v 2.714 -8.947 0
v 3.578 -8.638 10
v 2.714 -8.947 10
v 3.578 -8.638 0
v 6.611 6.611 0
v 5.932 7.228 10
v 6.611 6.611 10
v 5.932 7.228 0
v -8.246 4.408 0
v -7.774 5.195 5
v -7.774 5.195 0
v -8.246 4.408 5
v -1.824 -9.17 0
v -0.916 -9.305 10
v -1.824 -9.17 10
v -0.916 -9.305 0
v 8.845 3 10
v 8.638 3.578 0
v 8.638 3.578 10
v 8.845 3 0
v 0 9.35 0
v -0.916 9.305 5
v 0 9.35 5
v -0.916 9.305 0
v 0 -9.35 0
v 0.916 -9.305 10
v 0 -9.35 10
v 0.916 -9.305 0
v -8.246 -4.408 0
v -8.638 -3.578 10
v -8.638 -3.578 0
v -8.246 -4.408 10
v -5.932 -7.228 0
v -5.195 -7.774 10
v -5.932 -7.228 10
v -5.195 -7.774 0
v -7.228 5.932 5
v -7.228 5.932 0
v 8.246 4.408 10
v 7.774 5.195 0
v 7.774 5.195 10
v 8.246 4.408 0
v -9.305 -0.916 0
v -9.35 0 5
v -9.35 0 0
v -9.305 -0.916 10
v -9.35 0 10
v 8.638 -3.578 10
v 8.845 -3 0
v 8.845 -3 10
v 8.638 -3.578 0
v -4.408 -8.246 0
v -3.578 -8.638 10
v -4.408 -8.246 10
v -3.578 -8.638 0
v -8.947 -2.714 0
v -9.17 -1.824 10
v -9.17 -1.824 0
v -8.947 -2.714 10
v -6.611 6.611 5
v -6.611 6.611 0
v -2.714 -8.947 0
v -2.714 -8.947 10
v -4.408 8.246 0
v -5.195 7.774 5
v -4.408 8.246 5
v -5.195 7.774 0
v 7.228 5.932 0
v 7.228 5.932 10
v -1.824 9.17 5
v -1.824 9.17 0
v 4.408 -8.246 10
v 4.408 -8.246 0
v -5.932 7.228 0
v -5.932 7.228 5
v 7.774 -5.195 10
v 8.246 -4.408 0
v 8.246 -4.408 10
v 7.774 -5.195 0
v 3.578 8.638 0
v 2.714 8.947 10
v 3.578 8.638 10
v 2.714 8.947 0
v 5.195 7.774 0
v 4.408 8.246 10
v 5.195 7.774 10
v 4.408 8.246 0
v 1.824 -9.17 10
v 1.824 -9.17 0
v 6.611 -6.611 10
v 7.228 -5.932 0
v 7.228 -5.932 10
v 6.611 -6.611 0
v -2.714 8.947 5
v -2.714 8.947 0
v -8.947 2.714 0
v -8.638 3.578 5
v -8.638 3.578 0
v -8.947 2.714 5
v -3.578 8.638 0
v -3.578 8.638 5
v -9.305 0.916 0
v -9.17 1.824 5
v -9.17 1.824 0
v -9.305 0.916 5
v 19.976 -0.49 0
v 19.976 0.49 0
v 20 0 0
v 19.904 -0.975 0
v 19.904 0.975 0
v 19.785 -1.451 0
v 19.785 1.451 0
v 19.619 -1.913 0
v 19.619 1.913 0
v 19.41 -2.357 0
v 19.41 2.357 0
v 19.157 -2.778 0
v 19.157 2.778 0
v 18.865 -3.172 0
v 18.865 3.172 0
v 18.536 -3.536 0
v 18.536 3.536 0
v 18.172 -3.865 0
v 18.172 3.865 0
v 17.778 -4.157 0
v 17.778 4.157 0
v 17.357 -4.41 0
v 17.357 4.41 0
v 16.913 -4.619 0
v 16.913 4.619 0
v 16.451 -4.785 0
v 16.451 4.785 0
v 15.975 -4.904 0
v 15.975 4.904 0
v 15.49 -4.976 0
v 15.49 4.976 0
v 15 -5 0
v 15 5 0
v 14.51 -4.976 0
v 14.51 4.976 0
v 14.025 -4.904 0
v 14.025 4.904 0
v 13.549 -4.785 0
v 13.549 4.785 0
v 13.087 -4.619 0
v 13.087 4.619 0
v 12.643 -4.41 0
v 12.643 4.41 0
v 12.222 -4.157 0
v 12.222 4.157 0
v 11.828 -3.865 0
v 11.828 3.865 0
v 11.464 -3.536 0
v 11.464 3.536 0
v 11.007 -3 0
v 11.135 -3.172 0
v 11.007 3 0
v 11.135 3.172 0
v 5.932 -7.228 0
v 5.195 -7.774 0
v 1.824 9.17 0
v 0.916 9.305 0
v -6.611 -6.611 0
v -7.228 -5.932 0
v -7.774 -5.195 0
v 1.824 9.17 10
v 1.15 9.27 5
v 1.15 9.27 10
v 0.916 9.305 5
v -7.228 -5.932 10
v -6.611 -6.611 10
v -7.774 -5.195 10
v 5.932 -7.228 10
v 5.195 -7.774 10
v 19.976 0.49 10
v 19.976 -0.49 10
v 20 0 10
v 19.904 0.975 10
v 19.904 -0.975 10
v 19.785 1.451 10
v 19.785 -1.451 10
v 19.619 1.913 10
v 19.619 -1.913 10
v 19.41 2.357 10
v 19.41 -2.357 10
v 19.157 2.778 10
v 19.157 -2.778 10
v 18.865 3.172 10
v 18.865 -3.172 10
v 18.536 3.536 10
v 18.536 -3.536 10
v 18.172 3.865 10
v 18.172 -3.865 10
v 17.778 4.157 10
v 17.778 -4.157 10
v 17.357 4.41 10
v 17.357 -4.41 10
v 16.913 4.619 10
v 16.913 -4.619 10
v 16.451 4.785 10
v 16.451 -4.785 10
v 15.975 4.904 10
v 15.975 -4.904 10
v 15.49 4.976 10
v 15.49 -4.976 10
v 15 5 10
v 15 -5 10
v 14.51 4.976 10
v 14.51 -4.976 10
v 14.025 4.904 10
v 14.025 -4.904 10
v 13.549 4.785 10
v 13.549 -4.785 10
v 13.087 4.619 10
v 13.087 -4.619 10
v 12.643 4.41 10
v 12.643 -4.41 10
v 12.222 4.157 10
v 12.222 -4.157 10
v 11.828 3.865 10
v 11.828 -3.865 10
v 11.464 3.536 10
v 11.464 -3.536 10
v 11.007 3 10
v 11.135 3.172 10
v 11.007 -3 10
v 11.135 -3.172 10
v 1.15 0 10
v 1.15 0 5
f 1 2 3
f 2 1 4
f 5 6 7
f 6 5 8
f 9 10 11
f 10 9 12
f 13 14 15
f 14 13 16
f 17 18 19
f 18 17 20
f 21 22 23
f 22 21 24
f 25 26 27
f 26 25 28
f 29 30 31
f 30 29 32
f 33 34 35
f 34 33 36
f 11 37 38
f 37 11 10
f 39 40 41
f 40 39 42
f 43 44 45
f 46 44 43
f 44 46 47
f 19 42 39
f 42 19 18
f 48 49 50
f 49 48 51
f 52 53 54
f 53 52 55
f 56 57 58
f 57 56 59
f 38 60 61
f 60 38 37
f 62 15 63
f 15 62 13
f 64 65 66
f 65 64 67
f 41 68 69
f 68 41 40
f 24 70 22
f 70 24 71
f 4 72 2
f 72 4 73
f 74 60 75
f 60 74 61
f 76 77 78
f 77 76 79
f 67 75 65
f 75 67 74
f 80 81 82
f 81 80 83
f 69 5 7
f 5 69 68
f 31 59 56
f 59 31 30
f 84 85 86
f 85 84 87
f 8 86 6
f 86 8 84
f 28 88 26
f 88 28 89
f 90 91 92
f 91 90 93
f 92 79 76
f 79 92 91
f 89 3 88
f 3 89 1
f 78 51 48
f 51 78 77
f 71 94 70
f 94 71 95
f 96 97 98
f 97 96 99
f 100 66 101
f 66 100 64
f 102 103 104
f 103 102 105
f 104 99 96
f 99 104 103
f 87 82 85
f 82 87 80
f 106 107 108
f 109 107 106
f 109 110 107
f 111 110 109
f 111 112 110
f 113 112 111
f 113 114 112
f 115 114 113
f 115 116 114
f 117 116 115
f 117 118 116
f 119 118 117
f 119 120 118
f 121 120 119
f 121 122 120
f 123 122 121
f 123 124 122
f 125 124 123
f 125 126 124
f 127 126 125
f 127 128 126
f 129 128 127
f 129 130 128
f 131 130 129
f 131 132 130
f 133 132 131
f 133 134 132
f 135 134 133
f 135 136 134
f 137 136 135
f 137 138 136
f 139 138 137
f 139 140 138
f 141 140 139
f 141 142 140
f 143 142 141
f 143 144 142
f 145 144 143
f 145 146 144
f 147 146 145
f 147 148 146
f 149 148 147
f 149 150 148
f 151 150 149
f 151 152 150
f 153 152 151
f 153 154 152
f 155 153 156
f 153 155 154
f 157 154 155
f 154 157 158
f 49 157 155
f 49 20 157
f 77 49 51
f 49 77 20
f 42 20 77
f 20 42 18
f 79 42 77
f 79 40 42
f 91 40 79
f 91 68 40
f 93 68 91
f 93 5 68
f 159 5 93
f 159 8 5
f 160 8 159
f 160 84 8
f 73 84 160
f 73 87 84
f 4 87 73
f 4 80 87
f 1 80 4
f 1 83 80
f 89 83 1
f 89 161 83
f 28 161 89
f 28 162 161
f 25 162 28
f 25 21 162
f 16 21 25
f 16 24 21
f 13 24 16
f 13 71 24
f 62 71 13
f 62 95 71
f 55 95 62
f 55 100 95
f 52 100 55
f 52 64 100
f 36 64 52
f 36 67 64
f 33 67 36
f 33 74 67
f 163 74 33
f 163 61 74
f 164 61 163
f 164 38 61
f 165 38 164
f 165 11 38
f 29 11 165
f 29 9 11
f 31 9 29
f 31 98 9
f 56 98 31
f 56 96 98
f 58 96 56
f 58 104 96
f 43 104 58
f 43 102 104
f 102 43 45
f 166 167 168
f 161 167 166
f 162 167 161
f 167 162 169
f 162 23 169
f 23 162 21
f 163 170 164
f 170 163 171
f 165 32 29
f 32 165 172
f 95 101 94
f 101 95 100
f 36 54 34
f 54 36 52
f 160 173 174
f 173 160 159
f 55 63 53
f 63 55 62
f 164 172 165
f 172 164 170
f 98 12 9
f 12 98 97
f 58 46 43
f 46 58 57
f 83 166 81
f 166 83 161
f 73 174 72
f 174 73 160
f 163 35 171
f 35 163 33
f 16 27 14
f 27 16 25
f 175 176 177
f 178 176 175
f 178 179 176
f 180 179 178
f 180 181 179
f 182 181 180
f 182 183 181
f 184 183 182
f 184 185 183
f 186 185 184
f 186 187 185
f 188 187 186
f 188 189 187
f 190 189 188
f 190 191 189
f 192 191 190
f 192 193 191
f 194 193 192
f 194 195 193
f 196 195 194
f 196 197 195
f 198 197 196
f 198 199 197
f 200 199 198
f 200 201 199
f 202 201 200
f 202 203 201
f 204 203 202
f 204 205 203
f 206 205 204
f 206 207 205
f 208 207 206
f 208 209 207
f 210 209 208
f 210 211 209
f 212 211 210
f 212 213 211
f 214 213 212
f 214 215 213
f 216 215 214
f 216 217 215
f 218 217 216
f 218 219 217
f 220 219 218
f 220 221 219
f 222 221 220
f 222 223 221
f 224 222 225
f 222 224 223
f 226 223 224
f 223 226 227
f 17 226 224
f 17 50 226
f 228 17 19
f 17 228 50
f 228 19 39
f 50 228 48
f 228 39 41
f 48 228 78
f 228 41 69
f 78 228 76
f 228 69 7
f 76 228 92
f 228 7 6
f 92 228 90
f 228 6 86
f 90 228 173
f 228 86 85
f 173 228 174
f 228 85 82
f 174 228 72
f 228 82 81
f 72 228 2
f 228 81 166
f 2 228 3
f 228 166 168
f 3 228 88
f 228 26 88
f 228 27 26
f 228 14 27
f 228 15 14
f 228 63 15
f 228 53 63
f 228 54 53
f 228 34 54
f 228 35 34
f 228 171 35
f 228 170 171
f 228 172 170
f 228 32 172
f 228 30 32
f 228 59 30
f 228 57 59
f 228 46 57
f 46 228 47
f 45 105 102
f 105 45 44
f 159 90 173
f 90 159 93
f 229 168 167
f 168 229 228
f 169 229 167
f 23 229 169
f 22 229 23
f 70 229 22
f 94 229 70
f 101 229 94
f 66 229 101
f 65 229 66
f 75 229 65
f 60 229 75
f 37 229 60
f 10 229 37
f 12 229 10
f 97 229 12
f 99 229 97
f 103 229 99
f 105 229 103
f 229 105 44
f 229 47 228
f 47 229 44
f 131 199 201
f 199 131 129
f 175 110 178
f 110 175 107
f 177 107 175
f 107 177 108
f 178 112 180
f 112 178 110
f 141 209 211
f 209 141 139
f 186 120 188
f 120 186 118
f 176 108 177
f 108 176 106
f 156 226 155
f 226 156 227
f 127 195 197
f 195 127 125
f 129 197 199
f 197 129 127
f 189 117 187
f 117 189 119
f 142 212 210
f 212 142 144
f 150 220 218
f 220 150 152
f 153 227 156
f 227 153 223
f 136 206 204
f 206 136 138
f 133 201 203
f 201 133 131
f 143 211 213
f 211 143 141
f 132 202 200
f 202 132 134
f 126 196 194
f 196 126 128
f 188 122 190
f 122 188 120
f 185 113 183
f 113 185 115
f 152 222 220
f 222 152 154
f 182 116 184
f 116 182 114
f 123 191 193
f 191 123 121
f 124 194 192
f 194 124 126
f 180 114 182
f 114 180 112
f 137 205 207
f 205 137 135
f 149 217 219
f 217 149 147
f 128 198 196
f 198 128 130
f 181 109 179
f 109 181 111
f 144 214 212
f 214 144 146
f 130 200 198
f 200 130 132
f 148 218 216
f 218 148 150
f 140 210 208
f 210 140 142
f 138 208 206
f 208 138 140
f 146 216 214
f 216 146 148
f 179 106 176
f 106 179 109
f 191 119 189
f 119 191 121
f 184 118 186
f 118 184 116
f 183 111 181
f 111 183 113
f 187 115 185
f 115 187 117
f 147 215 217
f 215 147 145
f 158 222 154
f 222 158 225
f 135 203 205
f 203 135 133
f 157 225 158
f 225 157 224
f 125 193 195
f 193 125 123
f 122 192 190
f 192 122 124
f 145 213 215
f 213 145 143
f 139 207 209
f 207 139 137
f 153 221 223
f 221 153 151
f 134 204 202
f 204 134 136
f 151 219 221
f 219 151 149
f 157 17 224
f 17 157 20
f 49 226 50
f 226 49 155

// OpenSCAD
// Snap-on Clip for Lab Stand Rod and Tubing
// Orientation: Flat on XY plane, building up in +Z.
// Units: Millimetres.

// --- Dimensions ---
// Rod Stand Dimensions
$rod_diameter = 12.7;
$rod_wall_thickness = 3;
$rod_outer_diameter = $rod_diameter + 2 * $rod_wall_thickness; // 18.7
$rod_center = [0, 0];

// Tubing Dimensions
$tubing_diameter = 6;
$tubing_wall_thickness = 2;
$tubing_outer_diameter = $tubing_diameter + 2 * $tubing_wall_thickness; // 10
$tubing_center = [15, 0];

// Clip Geometry
$clip_height = 10;
$bridge_width_x = 4; // Distance between x=8 and x=12
$bridge_width_y = 6;
$opening_width_rod = 10;
$opening_width_tubing = 4.5;

// Extrusion settings
$fn = 64;

module rod_ring() {
    // Rod ring: 12.7mm ID, 3mm wall, centred at origin.
    // Opening cut: x < 0 and -5 < y < 5.
    
    // Main Ring
    difference() {
        // Extrude the full ring
        translate($rod_center)
        cylinder(h = $clip_height, d = $rod_outer_diameter, $fn = $fn);
        
        // Cut the opening on the -X side
        // Opening is 10mm wide, centred at y=0, so y goes from -5 to 5.
        // We cut a rectangle that extends slightly past the ring face to ensure clean cut.
        translate([-($rod_outer_diameter/2) - 0.5, 0, $clip_height/2])
        cube([
            $opening_width_rod + 1, // Width + clearance
            $opening_width_rod,     // Height (y)
            $clip_height + 0.5      // Depth (z)
        ]);
    }
}

module tubing_ring() {
    // Tubing ring: 6mm ID, 2mm wall, centred at x=15, y=0.
    // Opening cut: x > 15 and -2.25 < y < 2.25.
    
    difference() {
        // Extrude the full ring
        translate($tubing_center)
        cylinder(h = $clip_height, d = $tubing_outer_diameter, $fn = $fn);
        
        // Cut the opening on the +X side
        // Opening is 4.5mm wide, centred at y=0, so y goes from -2.25 to 2.25.
        // Cut rectangle extends past the ring face.
        translate([$tubing_outer_diameter/2 + 0.5, 0, $clip_height/2])
        cube([
            $opening_width_tubing + 1, // Width + clearance
            $opening_width_tubing,     // Height (y)
            $clip_height + 0.5         // Depth (z)
        ]);
    }
}

module bridge() {
    // Solid bridge: 6mm wide (Y), joining x=8 to x=12.
    // Height matches clip height.
    
    translate([8, -($bridge_width_y/2), 0])
    cube([
        $bridge_width_x, // x length (12-8)
        $bridge_width_y, // y width (6)
        $clip_height     // z height
    ]);
}

// --- Main Assembly ---
difference() {
    union() {
        rod_ring();
        tubing_ring();
        bridge();
    }
    
    // Optional: Add a small clearance cut if the rings are too tight, 
    // but based on prompt "snaps onto", we assume the rings are the final shape.
    // The prompt asks to build the part described, which includes the cuts.
}
